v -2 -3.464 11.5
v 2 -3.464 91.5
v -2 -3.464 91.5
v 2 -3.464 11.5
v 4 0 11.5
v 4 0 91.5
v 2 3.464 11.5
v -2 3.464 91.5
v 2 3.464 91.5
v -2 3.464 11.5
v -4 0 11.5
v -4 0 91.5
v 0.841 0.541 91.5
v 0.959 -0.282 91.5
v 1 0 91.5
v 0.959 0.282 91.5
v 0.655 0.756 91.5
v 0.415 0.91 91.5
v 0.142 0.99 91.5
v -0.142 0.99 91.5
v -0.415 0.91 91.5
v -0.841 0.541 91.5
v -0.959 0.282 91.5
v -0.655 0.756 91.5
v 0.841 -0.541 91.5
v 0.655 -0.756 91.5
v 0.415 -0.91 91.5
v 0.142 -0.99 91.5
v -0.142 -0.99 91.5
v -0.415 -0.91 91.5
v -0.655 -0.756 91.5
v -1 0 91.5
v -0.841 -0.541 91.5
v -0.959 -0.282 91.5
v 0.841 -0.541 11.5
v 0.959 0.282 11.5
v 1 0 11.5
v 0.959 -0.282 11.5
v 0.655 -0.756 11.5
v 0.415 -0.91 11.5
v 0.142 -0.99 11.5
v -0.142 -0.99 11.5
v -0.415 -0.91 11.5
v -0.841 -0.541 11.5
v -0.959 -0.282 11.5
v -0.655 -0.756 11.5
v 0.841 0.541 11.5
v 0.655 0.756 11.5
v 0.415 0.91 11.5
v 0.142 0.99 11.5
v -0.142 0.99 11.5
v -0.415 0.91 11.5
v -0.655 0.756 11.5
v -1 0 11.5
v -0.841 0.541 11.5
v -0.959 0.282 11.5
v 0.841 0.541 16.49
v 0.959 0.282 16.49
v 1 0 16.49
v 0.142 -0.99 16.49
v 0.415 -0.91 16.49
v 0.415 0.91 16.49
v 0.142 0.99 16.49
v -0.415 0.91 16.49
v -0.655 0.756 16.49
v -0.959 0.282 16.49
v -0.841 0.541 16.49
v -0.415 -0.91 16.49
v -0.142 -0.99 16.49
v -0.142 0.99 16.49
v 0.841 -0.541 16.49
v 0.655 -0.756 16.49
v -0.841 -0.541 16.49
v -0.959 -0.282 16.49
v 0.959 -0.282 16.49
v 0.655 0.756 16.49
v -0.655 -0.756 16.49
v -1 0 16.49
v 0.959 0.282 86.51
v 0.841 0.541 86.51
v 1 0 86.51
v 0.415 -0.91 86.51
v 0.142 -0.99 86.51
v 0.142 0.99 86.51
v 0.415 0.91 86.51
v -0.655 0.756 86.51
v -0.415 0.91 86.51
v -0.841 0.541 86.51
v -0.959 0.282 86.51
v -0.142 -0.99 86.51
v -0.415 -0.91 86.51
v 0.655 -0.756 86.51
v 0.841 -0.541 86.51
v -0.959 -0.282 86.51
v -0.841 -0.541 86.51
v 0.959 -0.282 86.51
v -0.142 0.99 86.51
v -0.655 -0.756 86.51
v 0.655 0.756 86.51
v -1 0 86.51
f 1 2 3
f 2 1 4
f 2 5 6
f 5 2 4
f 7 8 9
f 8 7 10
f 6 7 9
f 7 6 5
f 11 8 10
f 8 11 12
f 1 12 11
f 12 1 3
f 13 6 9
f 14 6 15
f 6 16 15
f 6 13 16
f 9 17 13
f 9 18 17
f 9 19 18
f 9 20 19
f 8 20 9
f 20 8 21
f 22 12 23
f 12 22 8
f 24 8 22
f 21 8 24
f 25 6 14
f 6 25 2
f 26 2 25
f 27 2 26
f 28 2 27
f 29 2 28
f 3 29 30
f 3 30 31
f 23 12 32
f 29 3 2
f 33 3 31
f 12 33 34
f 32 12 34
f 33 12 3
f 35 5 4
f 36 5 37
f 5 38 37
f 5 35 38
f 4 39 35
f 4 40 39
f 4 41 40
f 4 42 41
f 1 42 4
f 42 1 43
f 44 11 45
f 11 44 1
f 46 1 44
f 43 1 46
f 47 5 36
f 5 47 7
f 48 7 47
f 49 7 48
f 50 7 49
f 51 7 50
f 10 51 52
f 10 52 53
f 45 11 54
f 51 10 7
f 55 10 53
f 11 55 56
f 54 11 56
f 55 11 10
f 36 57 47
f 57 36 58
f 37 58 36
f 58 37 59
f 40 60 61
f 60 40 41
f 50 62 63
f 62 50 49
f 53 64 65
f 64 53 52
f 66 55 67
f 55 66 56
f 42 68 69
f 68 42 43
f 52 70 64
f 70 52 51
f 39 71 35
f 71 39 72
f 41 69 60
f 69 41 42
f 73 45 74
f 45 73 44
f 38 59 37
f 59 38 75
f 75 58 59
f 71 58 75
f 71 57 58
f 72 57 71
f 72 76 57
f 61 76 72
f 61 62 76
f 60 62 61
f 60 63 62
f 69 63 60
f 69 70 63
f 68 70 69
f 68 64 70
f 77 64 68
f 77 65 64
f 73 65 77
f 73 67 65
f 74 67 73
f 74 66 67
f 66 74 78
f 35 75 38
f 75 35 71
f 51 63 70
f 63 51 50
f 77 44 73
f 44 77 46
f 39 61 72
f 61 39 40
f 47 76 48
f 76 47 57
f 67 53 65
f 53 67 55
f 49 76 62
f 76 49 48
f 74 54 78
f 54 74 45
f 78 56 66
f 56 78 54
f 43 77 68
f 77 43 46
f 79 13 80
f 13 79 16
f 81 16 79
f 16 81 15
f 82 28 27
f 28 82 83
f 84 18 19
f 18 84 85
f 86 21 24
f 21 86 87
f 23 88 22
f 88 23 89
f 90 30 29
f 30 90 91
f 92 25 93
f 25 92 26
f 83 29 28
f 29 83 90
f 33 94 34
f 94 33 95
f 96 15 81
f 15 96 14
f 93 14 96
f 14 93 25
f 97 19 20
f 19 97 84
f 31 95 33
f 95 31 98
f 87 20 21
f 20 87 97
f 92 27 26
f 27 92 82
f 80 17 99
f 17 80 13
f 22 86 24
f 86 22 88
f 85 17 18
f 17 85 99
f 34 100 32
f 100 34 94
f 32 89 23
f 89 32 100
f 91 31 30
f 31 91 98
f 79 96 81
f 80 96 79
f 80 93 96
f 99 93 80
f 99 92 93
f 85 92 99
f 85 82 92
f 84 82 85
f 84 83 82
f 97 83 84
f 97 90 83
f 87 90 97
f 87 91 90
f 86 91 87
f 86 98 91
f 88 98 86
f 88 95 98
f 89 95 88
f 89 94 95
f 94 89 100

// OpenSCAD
// table.scad
// scanner part

F2=88;

// --------------------------------------------------------------------
module table(type=1){
  
  // plain flat base
  if((type==1)||(type==2)){
    color("gray")
    translate([0,0,11.5])
    cylinder(r=90,h=2,$fn=F1);
  }
  
  // add the support pillar in the center
  if(type==2){
    color("gray")
    translate([0,0,11.5])
    cylinder(r=6,h=100-11.5-10,$fn=F2);
  }
  
  // printable
  if(type==3){
    
    // tower
    difference(){
      
      union(){
        
        // table top
        color("gray")
        translate([0,0,11.5])
        cylinder(r=90,h=3,$fn=F2);

        // reinforce the base, convert to hex
        translate([0,0,11.5-4])
        cylinder(r1=8,r2=12,h=4,$fn=6);

        // add pins down to the slew10
        for(i=[0:7]){
          rotate([0,0,i*360/8+180/8]){
            color("pink")
            translate([0,82,11.5-3.6])
            cylinder(r1=1.2,r2=1.5,h=3.6+2,$fn=F2);      
          }
        }
        
      }
            
      // hole for the riser
      translate([0,0,11.5-5])
      cylinder(r1=4.0,r2=4.15,h=8.5,$fn=6);

      // holes in the pins down to the slew10
      for(i=[0:7]){
        rotate([0,0,i*360/8+180/8]){
          color("pink")
          translate([0,82,11.5-3.6-1-0.6])
          cylinder(r=0.5,h=3.6+2+2,$fn=F2);      
        }
      }

    }  // end diff

    if(0){
      // main rise
      translate([0,0,11.5])
      cylinder(r=4.0,h=100-11.5-10,$fn=6);
    }
    


  }
}

  
  


//------------------------------------------------------------
module riser1(hi=100){

  difference(){
    // main rise
    translate([0,0,11.5])
    cylinder(r=4.0,h=hi,$fn=6);

    translate([0,0,11.49])
    #cylinder(r=1.0,h=5,$fn=22);

    translate([0,0,hi+11.5-4.99])
    #cylinder(r=1.0,h=5,$fn=22);
  }
  
}

//=======================================

//table(type=3);

riser1(hi=80);

//==============================================
